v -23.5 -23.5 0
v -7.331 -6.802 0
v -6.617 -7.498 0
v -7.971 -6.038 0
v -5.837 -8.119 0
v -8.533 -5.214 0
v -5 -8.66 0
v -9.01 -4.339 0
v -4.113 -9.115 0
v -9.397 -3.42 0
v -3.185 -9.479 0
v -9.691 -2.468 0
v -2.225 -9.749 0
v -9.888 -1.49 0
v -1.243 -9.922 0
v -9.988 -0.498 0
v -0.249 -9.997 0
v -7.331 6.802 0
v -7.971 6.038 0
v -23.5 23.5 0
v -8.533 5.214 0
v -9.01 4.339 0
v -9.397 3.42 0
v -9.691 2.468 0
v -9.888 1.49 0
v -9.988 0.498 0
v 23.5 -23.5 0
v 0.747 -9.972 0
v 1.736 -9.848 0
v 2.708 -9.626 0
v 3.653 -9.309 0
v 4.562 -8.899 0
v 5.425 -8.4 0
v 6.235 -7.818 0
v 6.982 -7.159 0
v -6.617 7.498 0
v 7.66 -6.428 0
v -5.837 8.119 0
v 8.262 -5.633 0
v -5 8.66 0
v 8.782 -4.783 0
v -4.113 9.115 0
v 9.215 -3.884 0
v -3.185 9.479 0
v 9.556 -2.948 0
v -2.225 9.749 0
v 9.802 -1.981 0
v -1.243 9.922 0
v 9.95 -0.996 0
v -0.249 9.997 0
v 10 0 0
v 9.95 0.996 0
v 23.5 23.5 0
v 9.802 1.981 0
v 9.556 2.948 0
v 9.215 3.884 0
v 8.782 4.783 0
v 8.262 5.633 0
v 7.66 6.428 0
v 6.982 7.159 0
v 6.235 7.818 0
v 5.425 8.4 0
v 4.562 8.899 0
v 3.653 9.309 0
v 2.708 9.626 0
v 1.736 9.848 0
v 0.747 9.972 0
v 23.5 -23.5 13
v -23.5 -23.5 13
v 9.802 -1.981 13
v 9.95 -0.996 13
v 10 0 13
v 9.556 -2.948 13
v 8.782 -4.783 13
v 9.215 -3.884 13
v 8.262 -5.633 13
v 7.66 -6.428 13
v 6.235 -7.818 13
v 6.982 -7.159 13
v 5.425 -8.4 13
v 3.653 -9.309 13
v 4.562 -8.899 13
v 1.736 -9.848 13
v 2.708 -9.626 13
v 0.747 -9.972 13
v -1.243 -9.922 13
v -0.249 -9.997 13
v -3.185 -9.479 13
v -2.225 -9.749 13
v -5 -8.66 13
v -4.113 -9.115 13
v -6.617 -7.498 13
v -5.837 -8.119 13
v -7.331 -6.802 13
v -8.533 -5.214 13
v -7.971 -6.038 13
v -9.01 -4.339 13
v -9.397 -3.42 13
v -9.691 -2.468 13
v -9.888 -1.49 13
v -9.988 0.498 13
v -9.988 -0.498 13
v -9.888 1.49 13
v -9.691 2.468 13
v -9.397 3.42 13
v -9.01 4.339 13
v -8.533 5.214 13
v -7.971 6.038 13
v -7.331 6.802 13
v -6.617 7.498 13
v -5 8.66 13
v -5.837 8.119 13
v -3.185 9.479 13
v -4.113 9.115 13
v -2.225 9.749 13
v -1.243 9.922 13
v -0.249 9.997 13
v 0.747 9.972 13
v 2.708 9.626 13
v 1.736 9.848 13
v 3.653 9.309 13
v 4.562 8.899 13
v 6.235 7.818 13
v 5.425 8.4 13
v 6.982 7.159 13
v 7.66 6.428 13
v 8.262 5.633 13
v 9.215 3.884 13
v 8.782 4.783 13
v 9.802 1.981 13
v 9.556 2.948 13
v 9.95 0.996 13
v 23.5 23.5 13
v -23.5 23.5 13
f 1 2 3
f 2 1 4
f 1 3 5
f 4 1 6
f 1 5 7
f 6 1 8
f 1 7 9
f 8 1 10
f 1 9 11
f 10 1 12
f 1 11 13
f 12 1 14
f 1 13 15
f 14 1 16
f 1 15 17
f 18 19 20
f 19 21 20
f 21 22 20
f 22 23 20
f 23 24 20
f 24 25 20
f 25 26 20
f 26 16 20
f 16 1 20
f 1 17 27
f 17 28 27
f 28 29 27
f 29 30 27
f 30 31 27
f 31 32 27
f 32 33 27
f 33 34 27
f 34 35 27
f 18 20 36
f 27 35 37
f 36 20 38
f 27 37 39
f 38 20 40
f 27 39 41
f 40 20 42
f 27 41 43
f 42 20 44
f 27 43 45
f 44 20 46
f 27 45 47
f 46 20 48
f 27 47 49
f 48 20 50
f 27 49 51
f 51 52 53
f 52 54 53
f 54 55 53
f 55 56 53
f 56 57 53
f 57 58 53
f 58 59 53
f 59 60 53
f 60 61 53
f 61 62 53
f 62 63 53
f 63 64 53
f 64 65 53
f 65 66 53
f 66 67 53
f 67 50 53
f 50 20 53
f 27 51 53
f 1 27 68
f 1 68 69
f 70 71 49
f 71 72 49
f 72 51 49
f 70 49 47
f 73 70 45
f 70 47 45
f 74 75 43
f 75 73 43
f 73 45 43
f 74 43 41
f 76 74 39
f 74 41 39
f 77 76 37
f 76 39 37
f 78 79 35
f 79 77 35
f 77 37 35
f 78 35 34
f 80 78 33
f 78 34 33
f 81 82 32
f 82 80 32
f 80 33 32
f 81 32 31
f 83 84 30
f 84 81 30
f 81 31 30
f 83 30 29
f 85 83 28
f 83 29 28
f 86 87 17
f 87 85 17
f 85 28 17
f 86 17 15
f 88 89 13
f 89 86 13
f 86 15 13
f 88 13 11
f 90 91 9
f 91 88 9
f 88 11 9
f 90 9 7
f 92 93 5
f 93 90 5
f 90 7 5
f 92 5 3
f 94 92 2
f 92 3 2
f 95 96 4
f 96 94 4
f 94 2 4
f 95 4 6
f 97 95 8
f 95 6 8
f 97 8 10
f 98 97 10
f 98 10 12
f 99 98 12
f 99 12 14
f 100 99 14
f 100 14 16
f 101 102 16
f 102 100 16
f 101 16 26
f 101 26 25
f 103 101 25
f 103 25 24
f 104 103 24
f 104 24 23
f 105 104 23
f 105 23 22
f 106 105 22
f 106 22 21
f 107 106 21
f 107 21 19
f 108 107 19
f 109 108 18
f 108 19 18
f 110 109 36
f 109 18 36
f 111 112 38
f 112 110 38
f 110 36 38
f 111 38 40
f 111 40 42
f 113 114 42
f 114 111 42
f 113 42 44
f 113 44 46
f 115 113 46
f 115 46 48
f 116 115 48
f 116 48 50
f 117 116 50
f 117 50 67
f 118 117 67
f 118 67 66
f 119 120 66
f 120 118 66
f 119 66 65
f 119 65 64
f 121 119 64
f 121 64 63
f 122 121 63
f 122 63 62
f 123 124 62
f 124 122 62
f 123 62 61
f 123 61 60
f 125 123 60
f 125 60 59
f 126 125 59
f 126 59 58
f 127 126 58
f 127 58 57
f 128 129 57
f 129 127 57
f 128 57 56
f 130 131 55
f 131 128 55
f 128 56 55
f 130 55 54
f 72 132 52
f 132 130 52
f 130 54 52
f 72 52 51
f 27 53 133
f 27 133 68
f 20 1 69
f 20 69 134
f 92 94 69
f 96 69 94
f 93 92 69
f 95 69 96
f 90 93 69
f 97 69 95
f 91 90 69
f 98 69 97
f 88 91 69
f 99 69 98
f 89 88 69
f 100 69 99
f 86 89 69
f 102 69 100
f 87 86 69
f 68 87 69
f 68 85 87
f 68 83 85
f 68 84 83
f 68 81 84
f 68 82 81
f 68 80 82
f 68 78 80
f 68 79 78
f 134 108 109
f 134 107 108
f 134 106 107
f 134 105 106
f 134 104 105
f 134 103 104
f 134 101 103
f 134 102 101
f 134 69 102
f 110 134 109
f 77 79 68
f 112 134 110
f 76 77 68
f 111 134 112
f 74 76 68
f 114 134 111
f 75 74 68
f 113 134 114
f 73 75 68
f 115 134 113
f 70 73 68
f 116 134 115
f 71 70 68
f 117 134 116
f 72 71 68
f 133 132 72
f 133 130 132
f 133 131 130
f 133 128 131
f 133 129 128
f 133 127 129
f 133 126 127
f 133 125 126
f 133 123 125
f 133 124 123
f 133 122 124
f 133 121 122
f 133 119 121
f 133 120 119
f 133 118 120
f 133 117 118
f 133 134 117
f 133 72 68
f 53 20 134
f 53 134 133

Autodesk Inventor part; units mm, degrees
sketch "スケッチ1" plane through (0, 0, 0) normal (0, 0, 1) x (1, 0, 0)
  circle A0 centre (0, 0) radius 10
  line L0 (-23.5, 23.5) -> (23.5, 23.5)
  line L1 (23.5, 23.5) -> (23.5, -23.5)
  line L2 (23.5, -23.5) -> (-23.5, -23.5)
  line L3 (-23.5, -23.5) -> (-23.5, 23.5)
  line L4 (-23.5, 23.5) -> (23.5, -23.5) construction
  line L5 (23.5, 23.5) -> (-23.5, -23.5) construction
  dimension "d0" = 20
  dimension "d1" = 47
  dimension "d2" = 47
extrude "押し出し1" add sketch "スケッチ1" along normal blind 13
properties part number "bearing1b"
